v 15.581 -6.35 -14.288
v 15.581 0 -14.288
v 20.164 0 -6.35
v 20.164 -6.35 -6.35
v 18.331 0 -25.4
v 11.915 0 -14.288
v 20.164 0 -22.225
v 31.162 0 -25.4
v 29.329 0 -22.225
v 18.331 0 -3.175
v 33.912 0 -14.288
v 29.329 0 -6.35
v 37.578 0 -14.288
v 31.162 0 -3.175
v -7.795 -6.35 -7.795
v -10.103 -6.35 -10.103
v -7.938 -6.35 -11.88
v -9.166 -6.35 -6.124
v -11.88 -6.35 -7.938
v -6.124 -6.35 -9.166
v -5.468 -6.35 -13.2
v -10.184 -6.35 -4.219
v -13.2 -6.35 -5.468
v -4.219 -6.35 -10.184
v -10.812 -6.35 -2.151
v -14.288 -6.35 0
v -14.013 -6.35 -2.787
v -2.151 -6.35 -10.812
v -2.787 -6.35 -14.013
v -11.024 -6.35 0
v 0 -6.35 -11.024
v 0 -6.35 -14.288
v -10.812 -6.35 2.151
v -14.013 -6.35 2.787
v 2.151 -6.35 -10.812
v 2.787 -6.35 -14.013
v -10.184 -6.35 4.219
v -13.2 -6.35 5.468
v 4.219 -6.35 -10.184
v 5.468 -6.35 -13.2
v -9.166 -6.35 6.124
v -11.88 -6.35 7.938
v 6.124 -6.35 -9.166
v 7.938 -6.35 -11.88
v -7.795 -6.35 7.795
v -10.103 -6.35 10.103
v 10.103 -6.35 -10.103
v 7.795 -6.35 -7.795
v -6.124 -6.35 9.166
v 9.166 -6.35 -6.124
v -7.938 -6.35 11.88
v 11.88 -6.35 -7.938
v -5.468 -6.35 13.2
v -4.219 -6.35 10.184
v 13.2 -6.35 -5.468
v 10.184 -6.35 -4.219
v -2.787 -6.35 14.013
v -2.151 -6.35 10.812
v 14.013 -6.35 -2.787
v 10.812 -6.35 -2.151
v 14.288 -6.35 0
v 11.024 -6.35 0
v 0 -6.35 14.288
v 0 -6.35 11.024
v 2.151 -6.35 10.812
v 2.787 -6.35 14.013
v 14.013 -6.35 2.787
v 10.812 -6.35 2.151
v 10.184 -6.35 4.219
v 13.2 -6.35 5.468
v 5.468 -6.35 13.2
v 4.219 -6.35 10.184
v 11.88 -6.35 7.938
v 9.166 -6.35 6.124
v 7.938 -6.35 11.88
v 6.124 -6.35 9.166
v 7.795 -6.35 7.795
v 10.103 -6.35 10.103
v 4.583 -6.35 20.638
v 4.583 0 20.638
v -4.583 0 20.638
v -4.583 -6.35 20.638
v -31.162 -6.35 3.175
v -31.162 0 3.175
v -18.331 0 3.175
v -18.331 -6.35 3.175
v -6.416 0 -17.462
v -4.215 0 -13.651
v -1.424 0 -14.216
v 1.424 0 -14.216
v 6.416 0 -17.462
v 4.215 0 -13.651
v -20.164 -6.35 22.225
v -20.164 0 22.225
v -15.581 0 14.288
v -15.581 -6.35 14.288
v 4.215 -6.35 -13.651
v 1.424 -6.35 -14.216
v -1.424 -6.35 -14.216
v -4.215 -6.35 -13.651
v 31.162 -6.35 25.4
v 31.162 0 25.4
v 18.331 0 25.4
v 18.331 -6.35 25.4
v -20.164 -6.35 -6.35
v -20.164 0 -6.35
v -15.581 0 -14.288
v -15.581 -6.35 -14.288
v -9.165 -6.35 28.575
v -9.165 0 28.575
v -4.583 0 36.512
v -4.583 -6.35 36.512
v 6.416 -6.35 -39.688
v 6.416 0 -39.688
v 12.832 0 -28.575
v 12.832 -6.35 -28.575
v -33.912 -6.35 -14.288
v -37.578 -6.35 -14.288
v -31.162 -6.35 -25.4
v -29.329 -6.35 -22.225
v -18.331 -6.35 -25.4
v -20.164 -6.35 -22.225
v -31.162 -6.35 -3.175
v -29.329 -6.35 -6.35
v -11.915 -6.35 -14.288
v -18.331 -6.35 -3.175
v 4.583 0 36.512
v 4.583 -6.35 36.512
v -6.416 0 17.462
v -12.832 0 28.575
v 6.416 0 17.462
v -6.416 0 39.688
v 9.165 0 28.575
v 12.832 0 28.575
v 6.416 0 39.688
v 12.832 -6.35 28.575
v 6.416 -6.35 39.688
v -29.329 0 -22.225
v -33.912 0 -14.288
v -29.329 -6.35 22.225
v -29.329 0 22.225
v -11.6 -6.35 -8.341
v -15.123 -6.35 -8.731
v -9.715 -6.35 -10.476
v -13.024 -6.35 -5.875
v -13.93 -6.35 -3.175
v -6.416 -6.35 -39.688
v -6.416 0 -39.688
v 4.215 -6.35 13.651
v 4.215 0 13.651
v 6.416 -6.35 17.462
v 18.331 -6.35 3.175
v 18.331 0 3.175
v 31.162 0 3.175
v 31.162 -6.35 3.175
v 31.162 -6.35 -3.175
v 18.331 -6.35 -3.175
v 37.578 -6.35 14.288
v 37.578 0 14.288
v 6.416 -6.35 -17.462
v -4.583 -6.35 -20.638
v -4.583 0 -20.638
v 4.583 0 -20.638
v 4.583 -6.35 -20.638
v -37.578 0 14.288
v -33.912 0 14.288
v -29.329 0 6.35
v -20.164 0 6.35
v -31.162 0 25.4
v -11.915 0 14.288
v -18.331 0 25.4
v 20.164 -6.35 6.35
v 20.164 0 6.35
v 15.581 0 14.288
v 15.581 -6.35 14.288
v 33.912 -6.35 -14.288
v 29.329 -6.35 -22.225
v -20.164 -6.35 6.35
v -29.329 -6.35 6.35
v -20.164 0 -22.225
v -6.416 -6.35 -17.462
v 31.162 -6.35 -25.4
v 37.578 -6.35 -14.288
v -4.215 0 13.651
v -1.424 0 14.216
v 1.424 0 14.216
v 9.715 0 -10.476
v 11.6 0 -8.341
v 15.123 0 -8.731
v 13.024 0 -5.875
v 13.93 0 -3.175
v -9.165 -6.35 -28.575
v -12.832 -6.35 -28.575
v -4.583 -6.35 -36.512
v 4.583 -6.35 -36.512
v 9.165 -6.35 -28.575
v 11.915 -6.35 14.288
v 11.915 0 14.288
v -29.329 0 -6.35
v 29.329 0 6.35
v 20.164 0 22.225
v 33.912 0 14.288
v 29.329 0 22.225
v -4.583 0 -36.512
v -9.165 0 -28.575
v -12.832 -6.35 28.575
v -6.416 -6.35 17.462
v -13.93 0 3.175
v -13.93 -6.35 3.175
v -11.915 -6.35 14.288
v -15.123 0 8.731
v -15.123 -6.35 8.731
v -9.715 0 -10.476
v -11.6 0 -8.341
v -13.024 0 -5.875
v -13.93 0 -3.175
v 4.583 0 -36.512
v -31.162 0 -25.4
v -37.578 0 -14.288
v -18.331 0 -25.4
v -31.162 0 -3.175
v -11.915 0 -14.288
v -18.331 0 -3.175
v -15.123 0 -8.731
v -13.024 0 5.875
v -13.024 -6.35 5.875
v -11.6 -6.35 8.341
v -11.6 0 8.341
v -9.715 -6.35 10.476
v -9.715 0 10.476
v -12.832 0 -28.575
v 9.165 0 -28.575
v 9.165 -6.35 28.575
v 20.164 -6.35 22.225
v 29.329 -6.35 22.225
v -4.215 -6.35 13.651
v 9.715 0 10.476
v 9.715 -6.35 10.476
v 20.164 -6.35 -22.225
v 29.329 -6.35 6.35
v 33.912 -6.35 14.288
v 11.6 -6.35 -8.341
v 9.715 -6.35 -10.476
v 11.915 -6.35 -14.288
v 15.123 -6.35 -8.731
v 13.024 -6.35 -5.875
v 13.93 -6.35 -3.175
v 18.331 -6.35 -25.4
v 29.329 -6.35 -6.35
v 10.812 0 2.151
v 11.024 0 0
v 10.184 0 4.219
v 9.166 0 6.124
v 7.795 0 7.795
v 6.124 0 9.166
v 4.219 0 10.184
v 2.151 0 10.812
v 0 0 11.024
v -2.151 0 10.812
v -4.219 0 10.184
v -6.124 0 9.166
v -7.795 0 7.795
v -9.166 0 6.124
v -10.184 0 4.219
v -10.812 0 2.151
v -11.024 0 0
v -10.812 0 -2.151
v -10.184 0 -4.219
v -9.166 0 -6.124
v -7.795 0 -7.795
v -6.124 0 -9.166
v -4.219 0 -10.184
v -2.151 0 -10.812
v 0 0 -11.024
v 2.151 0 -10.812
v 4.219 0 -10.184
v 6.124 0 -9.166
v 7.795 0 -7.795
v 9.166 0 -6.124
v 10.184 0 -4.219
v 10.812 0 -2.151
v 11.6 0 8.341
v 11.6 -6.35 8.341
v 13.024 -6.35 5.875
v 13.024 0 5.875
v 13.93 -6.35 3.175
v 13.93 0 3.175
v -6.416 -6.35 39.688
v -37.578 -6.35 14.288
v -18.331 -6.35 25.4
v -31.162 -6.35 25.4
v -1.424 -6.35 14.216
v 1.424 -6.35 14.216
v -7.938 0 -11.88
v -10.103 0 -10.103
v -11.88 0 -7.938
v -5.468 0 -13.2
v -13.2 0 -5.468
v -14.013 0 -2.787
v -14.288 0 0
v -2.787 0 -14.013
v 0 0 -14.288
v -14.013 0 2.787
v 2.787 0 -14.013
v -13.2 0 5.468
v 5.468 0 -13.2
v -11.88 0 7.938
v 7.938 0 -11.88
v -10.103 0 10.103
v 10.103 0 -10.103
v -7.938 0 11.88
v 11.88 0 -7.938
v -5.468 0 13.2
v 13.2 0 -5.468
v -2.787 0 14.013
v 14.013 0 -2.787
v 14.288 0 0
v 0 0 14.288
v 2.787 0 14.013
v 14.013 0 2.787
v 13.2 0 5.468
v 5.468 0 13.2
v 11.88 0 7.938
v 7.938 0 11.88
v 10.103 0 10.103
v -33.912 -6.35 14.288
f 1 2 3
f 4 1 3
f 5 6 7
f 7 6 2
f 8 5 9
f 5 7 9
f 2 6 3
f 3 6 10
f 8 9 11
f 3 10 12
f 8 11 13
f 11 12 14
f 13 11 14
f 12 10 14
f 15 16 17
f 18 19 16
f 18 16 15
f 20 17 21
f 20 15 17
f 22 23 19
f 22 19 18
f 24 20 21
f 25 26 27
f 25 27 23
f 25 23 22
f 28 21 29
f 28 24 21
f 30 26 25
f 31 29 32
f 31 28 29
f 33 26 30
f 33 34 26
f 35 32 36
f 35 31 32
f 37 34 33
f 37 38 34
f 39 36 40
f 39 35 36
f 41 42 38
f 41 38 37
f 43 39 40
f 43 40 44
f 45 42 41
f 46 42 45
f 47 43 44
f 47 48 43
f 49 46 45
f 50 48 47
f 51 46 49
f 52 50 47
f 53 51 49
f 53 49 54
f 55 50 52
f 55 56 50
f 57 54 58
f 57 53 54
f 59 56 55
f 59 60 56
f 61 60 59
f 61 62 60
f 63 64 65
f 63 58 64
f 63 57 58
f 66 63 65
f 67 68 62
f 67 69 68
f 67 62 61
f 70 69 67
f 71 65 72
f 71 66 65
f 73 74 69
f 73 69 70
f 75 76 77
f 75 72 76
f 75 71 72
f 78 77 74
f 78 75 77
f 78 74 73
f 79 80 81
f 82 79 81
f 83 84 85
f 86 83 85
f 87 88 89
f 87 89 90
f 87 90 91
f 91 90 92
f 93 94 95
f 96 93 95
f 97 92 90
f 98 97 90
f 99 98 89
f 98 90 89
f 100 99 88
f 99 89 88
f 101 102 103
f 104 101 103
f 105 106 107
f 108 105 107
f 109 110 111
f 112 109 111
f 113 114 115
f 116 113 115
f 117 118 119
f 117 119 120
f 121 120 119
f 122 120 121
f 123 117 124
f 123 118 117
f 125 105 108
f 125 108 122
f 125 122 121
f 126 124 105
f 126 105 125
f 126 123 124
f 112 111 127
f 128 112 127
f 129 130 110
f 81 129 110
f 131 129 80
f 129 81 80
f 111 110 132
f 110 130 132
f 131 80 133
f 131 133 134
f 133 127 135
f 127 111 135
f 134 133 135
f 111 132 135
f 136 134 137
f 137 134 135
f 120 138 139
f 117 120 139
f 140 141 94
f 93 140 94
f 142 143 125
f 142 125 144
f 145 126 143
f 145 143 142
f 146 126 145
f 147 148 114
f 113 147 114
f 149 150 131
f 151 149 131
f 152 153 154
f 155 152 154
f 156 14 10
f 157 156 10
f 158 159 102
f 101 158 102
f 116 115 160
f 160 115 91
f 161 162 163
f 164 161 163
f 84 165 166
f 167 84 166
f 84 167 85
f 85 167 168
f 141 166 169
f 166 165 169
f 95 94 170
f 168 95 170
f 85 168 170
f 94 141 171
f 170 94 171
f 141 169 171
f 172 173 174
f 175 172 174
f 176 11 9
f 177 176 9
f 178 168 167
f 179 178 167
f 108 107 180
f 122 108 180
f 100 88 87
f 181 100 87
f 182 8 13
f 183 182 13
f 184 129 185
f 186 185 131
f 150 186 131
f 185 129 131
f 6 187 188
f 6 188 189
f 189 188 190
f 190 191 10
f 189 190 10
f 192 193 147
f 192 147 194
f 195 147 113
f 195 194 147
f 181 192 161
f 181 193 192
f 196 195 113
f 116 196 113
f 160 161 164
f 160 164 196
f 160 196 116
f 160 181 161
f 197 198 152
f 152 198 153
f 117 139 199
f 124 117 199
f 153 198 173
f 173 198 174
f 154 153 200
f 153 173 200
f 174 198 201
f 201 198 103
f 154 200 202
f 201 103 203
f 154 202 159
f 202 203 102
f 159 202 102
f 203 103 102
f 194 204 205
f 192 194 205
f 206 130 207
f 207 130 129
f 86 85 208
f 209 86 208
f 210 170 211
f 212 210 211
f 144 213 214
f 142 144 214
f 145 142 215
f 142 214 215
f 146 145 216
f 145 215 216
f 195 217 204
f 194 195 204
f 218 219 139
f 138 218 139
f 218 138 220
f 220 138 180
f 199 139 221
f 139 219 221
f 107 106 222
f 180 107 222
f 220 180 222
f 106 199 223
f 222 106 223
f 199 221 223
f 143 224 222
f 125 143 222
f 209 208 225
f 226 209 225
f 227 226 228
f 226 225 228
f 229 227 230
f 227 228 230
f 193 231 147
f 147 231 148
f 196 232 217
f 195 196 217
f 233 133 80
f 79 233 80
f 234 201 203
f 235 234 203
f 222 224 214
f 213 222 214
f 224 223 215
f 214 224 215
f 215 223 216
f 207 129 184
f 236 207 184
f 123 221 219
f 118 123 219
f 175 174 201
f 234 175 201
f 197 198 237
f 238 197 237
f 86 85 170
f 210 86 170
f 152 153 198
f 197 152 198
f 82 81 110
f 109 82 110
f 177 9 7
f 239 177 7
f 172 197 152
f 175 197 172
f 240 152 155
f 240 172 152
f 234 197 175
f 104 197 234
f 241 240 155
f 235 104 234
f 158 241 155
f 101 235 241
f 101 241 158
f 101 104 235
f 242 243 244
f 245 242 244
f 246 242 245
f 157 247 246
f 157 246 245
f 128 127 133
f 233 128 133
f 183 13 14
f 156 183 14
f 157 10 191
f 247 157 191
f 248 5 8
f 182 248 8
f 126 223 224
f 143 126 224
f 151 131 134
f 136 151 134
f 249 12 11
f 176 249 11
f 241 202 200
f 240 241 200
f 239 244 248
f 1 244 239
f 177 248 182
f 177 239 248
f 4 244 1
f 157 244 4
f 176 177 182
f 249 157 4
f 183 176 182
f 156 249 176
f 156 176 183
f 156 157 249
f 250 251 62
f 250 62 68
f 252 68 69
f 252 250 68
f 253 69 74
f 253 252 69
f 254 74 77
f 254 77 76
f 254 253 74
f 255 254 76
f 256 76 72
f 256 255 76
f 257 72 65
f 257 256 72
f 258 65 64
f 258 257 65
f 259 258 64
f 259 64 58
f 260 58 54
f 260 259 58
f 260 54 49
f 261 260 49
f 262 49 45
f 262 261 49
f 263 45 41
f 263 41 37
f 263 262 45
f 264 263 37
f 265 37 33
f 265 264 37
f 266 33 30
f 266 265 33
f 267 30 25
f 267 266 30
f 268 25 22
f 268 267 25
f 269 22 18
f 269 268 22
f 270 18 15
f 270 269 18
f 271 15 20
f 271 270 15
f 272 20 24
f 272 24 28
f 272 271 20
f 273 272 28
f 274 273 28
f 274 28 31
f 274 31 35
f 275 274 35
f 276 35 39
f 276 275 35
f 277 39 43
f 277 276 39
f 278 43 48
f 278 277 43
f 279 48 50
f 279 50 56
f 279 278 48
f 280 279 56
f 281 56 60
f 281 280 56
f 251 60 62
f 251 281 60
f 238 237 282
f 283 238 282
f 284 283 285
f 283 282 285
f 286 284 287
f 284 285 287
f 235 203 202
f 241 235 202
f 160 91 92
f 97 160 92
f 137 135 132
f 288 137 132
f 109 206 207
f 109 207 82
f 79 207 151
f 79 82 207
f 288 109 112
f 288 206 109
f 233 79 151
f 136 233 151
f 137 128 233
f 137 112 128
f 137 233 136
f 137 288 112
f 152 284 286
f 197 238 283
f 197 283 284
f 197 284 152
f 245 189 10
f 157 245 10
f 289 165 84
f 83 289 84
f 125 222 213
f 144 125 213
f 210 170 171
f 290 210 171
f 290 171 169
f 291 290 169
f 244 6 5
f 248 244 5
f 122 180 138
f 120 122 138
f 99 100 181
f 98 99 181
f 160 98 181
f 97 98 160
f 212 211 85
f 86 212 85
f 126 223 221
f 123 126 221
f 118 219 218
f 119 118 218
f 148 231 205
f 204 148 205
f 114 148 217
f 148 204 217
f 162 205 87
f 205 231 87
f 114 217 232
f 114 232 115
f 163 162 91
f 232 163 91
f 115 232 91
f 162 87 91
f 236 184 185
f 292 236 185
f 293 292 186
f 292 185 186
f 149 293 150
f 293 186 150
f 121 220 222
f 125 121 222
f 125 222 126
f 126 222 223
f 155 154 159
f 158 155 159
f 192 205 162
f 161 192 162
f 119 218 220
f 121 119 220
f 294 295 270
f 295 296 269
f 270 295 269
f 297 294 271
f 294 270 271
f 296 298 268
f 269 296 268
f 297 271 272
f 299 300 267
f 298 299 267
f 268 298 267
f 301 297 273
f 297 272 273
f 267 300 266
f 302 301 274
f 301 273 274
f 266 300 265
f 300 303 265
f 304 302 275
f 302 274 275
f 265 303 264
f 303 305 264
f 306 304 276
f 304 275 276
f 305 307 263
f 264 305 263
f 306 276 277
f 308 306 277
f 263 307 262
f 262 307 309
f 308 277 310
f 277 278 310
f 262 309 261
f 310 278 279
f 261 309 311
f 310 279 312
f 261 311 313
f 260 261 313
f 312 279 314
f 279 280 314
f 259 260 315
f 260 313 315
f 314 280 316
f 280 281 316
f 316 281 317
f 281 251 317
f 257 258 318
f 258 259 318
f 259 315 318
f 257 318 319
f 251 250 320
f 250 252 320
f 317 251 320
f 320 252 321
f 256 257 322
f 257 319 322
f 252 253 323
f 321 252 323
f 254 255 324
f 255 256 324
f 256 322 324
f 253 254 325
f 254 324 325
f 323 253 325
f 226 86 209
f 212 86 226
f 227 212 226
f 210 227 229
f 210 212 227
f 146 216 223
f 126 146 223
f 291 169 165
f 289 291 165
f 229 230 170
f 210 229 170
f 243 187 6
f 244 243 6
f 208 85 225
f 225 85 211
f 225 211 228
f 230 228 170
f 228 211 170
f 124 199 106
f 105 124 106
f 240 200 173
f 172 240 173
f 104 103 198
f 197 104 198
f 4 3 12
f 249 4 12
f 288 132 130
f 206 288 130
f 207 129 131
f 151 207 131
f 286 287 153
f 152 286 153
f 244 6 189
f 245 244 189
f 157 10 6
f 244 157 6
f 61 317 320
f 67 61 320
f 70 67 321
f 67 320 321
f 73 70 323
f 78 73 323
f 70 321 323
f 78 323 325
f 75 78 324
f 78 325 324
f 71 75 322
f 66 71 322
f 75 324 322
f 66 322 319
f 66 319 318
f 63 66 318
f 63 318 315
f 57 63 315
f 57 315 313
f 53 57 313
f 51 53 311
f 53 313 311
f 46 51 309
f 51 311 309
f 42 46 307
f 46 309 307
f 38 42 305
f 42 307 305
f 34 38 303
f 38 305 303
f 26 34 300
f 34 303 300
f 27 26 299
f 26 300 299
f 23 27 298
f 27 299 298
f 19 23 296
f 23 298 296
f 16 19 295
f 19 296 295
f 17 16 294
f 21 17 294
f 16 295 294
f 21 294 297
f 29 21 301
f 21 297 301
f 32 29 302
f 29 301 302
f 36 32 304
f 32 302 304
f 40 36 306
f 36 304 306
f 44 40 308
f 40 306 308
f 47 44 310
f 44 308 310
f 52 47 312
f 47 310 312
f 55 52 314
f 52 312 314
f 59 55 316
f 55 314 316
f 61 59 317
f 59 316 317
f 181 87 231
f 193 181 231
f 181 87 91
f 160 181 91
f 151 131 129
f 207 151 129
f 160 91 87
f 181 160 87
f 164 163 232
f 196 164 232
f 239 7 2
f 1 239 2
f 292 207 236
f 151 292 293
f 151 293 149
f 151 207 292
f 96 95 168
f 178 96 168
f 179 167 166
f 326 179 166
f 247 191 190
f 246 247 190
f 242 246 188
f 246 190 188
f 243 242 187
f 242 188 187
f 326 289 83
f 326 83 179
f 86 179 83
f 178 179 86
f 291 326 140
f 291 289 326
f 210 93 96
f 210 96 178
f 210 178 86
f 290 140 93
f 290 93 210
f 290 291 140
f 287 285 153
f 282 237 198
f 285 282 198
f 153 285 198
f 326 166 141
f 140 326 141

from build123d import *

# Parameters (mm, degrees)
F0_R     = 14.2875
F0_R_2   = 11.0236
F2_DEPTH = 6.35


with BuildPart() as f2:
    # F0 (on Front) → F2 (new body)
    with BuildSketch(Plane.XZ):
        Circle(F0_R)
        Circle(F0_R_2, mode=Mode.SUBTRACT)
    extrude(amount=F2_DEPTH)


with BuildPart() as f2b:
    # F0 (on Front) → F2, piece 2 (new body)
    with BuildSketch(Plane.XZ):
        Polygon((-6.4158048664, 17.4625), (6.4158048664, 17.4625), (12.8316097327, 28.575), (6.4158048664, 39.6875), (-6.4158048664, 39.6875), (-12.8316097327, 28.575), align=None)
        Polygon((9.1654355234, 28.575), (4.5827177617, 20.6375), (-4.5827177617, 20.6375), (-9.1654355234, 28.575), (-4.5827177617, 36.5125), (4.5827177617, 36.5125), align=None, mode=Mode.SUBTRACT)
    extrude(amount=F2_DEPTH)


with BuildPart() as f2c:
    # F0 (on Front) → F2, piece 3 (new body)
    with BuildSketch(Plane.XZ):
        Polygon((-11.9150661804, 14.2875), (-18.3308710468, 25.4), (-31.1624807795, 25.4), (-37.5782856459, 14.2875), (-31.1624807795, 3.175), (-18.3308710468, 3.175), align=None)
        Polygon((-20.1639581514, 22.225), (-15.5812403898, 14.2875), (-20.1639581514, 6.35), (-29.3293936748, 6.35), (-33.9121114365, 14.2875), (-29.3293936748, 22.225), align=None, mode=Mode.SUBTRACT)
    extrude(amount=F2_DEPTH)


with BuildPart() as f2d:
    # F0 (on Front) → F2, piece 4 (new body)
    with BuildSketch(Plane.XZ):
        Polygon((-18.3308710468, -3.175), (-31.1624807795, -3.175), (-37.5782856459, -14.2875), (-31.1624807795, -25.4), (-18.3308710468, -25.4), (-11.9150661804, -14.2875), align=None)
        Polygon((-29.3293936748, -6.35), (-20.1639581514, -6.35), (-15.5812403898, -14.2875), (-20.1639581514, -22.225), (-29.3293936748, -22.225), (-33.9121114365, -14.2875), align=None, mode=Mode.SUBTRACT)
    extrude(amount=F2_DEPTH)


with BuildPart() as f2e:
    # F0 (on Front) → F2, piece 5 (new body)
    with BuildSketch(Plane.XZ):
        Polygon((-6.4158048664, -17.4625), (-12.8316097327, -28.575), (-6.4158048664, -39.6875), (6.4158048664, -39.6875), (12.8316097327, -28.575), (6.4158048664, -17.4625), align=None)
        Polygon((-9.1654355234, -28.575), (-4.5827177617, -20.6375), (4.5827177617, -20.6375), (9.1654355234, -28.575), (4.5827177617, -36.5125), (-4.5827177617, -36.5125), align=None, mode=Mode.SUBTRACT)
    extrude(amount=F2_DEPTH)


with BuildPart() as f2f:
    # F0 (on Front) → F2, piece 6 (new body)
    with BuildSketch(Plane.XZ):
        Polygon((11.9150661804, -14.2875), (18.3308710468, -25.4), (31.1624807795, -25.4), (37.5782856459, -14.2875), (31.1624807795, -3.175), (18.3308710468, -3.175), align=None)
        Polygon((20.1639581514, -22.225), (15.5812403898, -14.2875), (20.1639581514, -6.35), (29.3293936748, -6.35), (33.9121114365, -14.2875), (29.3293936748, -22.225), align=None, mode=Mode.SUBTRACT)
    extrude(amount=F2_DEPTH)


with BuildPart() as f2g:
    # F0 (on Front) → F2, piece 7 (new body)
    with BuildSketch(Plane.XZ):
        Polygon((18.3308710468, 3.175), (31.1624807795, 3.175), (37.5782856459, 14.2875), (31.1624807795, 25.4), (18.3308710468, 25.4), (11.9150661804, 14.2875), align=None)
        Polygon((29.3293936748, 6.35), (20.1639581514, 6.35), (15.5812403898, 14.2875), (20.1639581514, 22.225), (29.3293936748, 22.225), (33.9121114365, 14.2875), align=None, mode=Mode.SUBTRACT)
    extrude(amount=F2_DEPTH)


with BuildPart() as f2h:
    # F1 (on Front) → F2, piece 8 (new body)
    with BuildSketch(Plane.XZ):
        with BuildLine():
            Line((-18.3308710468, 3.175), (-13.930255965, 3.175))
            ThreePointArc((-13.930255965, 3.175), (-12.3733379566, 7.14375), (-9.7147586395, 10.4764555469))
            Line((-9.7147586395, 10.4764555469), (-11.9150661804, 14.2875))
            Line((-11.9150661804, 14.2875), (-15.1229686921, 8.731249864))
            Line((-15.1229686921, 8.731249864), (-18.3308710468, 3.175))
        make_face()
    extrude(amount=F2_DEPTH)


with BuildPart() as f2i:
    # F1 (on Front) → F2, piece 9 (new body)
    with BuildSketch(Plane.XZ):
        with BuildLine():
            Line((-15.1229686619, -8.7312499162), (-11.9150661804, -14.2875))
            Line((-11.9150661804, -14.2875), (-9.7147586395, -10.4764555469))
            ThreePointArc((-9.7147586395, -10.4764555469), (-12.3733379566, -7.14375), (-13.930255965, -3.175))
            Line((-13.930255965, -3.175), (-18.3308710468, -3.175))
            Line((-18.3308710468, -3.175), (-15.1229686619, -8.7312499162))
        make_face()
    extrude(amount=F2_DEPTH)


with BuildPart() as f2j:
    # F1 (on Front) → F2, piece 10 (new body)
    with BuildSketch(Plane.XZ):
        with BuildLine():
            ThreePointArc((4.2154973255, -13.6514555469), (0, -14.2875), (-4.2154973255, -13.6514555469))
            Line((-4.2154973255, -13.6514555469), (-6.4158048664, -17.4625))
            Line((-6.4158048664, -17.4625), (0, -17.4625))
            Line((0, -17.4625), (6.4158048664, -17.4625))
            Line((6.4158048664, -17.4625), (4.2154973255, -13.6514555469))
        make_face()
    extrude(amount=F2_DEPTH)


with BuildPart() as f2k:
    # F1 (on Front) → F2, piece 11 (new body)
    with BuildSketch(Plane.XZ):
        with BuildLine():
            ThreePointArc((13.930255965, -3.175), (12.3733379566, -7.14375), (9.7147586395, -10.4764555469))
            Line((9.7147586395, -10.4764555469), (11.9150661804, -14.2875))
            Line((11.9150661804, -14.2875), (15.1229686921, -8.731249864))
            Line((15.1229686921, -8.731249864), (18.3308710468, -3.175))
            Line((18.3308710468, -3.175), (13.930255965, -3.175))
        make_face()
    extrude(amount=F2_DEPTH)


with BuildPart() as f2l:
    # F1 (on Front) → F2, piece 12 (new body)
    with BuildSketch(Plane.XZ):
        with BuildLine():
            Line((11.9150661804, 14.2875), (9.7147586395, 10.4764555469))
            ThreePointArc((9.7147586395, 10.4764555469), (12.3733379566, 7.14375), (13.930255965, 3.175))
            Line((13.930255965, 3.175), (18.3308710468, 3.175))
            Line((18.3308710468, 3.175), (15.1229686901, 8.7312498675))
            Line((15.1229686901, 8.7312498675), (11.9150661804, 14.2875))
        make_face()
    extrude(amount=F2_DEPTH)


with BuildPart() as f2m:
    # F1 (on Front) → F2, piece 13 (new body)
    with BuildSketch(Plane.XZ):
        with BuildLine():
            Line((-6.4158048664, 17.4625), (-4.2154973255, 13.6514555469))
            ThreePointArc((-4.2154973255, 13.6514555469), (0, 14.2875), (4.2154973255, 13.6514555469))
            Line((4.2154973255, 13.6514555469), (6.4158048664, 17.4625))
            Line((6.4158048664, 17.4625), (0, 17.4625))
            Line((0, 17.4625), (-6.4158048664, 17.4625))
        make_face()
    extrude(amount=F2_DEPTH)


solid = Compound([f2.part, f2b.part, f2c.part, f2d.part, f2e.part, f2f.part, f2g.part, f2h.part, f2i.part, f2j.part, f2k.part, f2l.part, f2m.part])
